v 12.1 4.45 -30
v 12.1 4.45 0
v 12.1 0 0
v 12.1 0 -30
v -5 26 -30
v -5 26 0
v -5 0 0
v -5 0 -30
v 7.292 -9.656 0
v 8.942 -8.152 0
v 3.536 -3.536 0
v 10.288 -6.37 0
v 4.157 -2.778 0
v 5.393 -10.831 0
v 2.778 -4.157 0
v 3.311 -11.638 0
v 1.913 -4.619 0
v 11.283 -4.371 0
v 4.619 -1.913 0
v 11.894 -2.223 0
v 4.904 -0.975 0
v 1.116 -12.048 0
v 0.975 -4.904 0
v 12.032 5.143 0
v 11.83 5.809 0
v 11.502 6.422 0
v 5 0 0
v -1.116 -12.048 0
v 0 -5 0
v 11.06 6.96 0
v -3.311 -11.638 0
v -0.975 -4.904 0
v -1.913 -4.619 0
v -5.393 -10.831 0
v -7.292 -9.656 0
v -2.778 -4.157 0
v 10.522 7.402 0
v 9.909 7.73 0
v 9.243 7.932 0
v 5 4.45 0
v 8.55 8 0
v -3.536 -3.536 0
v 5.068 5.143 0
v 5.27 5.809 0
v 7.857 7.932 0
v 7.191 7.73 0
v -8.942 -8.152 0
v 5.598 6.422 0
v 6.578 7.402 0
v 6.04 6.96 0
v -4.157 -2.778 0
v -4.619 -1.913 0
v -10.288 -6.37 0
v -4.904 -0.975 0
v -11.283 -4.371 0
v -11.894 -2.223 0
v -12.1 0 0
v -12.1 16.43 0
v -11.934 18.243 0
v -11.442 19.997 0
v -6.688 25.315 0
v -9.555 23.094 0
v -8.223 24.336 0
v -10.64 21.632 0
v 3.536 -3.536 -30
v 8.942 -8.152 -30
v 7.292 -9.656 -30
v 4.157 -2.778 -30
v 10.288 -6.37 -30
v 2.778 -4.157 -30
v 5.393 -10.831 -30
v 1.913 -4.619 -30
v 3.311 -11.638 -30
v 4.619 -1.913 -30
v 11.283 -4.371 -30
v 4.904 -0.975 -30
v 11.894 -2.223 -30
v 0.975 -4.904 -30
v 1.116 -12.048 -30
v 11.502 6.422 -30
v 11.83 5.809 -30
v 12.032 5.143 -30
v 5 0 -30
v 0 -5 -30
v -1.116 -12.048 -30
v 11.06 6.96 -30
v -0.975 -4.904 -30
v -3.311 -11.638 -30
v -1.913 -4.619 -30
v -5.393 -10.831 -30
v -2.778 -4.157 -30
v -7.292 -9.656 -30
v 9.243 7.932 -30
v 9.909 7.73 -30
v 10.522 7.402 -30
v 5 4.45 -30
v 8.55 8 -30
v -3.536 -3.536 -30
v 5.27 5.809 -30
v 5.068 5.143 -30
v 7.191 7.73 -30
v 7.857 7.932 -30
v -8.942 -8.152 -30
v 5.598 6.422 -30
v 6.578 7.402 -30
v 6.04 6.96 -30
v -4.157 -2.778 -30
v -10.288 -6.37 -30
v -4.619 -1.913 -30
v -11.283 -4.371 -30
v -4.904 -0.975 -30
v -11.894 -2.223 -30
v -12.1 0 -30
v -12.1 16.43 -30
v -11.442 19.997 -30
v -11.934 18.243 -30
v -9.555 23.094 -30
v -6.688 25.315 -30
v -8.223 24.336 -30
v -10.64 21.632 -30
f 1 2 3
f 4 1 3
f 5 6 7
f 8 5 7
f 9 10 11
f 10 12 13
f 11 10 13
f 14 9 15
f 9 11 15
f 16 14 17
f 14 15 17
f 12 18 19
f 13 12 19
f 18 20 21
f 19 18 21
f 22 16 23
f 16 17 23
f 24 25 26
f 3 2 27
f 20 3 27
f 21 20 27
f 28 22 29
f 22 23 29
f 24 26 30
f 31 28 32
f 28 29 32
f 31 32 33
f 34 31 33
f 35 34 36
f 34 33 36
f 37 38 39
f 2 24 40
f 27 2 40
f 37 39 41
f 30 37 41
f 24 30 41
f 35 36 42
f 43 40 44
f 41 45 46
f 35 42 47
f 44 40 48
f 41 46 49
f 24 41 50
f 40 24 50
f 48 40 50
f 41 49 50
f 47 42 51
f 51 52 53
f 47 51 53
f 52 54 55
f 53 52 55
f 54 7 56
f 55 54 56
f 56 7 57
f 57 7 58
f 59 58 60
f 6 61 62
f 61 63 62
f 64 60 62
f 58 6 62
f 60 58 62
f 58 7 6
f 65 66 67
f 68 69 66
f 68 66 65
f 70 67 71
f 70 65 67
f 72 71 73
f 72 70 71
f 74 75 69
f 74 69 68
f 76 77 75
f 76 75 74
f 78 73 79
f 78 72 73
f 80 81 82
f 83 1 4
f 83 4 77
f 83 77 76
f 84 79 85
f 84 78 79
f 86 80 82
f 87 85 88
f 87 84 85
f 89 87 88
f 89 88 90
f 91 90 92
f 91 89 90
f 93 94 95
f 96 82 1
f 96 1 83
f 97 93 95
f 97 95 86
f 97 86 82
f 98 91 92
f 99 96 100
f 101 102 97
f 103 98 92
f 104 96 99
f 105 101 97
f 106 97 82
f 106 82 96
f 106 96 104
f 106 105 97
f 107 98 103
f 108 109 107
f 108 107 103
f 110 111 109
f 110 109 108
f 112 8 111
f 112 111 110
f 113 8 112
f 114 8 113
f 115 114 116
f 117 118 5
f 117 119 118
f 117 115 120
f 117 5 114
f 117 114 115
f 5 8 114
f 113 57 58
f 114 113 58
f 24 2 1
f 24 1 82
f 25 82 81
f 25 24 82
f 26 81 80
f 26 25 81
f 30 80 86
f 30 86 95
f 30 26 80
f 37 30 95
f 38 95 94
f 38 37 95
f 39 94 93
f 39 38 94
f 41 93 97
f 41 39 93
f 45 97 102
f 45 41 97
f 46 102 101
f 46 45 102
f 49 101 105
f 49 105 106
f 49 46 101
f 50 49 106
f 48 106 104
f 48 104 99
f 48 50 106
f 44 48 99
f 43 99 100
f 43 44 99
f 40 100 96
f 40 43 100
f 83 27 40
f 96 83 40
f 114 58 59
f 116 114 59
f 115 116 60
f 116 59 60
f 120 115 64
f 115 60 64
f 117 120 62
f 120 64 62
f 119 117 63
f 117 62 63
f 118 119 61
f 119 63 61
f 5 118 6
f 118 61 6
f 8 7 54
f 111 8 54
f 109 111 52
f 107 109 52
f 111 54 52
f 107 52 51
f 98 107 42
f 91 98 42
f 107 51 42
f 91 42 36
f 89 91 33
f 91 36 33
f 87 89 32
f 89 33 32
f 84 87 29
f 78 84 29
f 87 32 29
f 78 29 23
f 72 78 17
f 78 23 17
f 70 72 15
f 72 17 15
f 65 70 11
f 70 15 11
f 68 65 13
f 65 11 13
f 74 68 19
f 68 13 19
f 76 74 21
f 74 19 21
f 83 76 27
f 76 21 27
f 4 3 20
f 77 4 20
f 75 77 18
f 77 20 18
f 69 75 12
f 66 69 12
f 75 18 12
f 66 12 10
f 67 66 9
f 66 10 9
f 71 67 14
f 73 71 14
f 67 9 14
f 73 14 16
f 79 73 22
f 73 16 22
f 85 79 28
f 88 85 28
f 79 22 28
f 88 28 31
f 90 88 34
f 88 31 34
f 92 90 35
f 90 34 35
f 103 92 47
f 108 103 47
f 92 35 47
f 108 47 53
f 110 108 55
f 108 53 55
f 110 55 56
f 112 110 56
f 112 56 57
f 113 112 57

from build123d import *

# Parameters (mm, degrees)
BOSS_EXTRUDE1_DEPTH = 30
FILLET1_R           = 10
FILLET3_RADIUS      = 3.55
FILLET3_LENGTH      = 30


with BuildPart() as part:
    # Sketch1 → Boss-Extrude1 (new body)
    with BuildSketch(Plane.XY):
        with BuildLine():
            Line((5, 0), (5, 8))
            Line((5, 8), (12.1, 8))
            Line((12.1, 8), (12.1, 0))
            ThreePointArc((12.1, 0), (0, -12.1), (-12.1, 0))
            Line((-12.1, 0), (-12.1, 26))
            Line((-12.1, 26), (-5, 26))
            Line((-5, 26), (-5, 0))
            ThreePointArc((-5, 0), (0, -5), (5, 0))
        make_face()
    extrude(amount=-BOSS_EXTRUDE1_DEPTH)

    # Fillet1
    # the kernel refuses this fillet: 10 mm, written as the material it takes off along each edge
    with BuildSketch(Plane(origin=(-12.1, 26, 23.925666135), x_dir=(0, -1, 0), z_dir=(0, 0, -1))) as fillet1_piece_1:
        with BuildLine():
            CenterArc((9.570266454, -10), FILLET1_R, 90, 73.142043978)
            Line((0, -7.1), (-0.191405329, -7.042))
            ThreePointArc((-0.191405329, -7.042), (-0.2, -3.55), (-0.2, 0))
            Line((-0.2, 0), (0, 0.2))
            Line((0, 0.2), (9.570266454, 0.2))
            Line((9.570266454, 0.2), (9.570266454, 0))
        make_face()
    extrude(amount=77.85133227, mode=Mode.SUBTRACT)

    # Fillet3: full round fillet: the end face becomes a half cylinder, R = half its width
    fillet3_face = Plane((8.55, 8, -15), x_dir=(0, 0, 1), z_dir=(0, 1, 0))  # on the end face: x along it, z out of the body
    fillet3_slab = fillet3_face.offset(-FILLET3_RADIUS / 2) * Box(FILLET3_LENGTH, 2 * FILLET3_RADIUS, FILLET3_RADIUS, mode=Mode.PRIVATE)  # the body's end, R deep
    fillet3_round = Plane((8.55, 4.45, -15), x_dir=(0, 1, 0), z_dir=(0, 0, 1)) * Cylinder(FILLET3_RADIUS, FILLET3_LENGTH, mode=Mode.PRIVATE)  # its axis R under the face
    add(fillet3_slab - fillet3_round, mode=Mode.SUBTRACT)


solid = part.part
